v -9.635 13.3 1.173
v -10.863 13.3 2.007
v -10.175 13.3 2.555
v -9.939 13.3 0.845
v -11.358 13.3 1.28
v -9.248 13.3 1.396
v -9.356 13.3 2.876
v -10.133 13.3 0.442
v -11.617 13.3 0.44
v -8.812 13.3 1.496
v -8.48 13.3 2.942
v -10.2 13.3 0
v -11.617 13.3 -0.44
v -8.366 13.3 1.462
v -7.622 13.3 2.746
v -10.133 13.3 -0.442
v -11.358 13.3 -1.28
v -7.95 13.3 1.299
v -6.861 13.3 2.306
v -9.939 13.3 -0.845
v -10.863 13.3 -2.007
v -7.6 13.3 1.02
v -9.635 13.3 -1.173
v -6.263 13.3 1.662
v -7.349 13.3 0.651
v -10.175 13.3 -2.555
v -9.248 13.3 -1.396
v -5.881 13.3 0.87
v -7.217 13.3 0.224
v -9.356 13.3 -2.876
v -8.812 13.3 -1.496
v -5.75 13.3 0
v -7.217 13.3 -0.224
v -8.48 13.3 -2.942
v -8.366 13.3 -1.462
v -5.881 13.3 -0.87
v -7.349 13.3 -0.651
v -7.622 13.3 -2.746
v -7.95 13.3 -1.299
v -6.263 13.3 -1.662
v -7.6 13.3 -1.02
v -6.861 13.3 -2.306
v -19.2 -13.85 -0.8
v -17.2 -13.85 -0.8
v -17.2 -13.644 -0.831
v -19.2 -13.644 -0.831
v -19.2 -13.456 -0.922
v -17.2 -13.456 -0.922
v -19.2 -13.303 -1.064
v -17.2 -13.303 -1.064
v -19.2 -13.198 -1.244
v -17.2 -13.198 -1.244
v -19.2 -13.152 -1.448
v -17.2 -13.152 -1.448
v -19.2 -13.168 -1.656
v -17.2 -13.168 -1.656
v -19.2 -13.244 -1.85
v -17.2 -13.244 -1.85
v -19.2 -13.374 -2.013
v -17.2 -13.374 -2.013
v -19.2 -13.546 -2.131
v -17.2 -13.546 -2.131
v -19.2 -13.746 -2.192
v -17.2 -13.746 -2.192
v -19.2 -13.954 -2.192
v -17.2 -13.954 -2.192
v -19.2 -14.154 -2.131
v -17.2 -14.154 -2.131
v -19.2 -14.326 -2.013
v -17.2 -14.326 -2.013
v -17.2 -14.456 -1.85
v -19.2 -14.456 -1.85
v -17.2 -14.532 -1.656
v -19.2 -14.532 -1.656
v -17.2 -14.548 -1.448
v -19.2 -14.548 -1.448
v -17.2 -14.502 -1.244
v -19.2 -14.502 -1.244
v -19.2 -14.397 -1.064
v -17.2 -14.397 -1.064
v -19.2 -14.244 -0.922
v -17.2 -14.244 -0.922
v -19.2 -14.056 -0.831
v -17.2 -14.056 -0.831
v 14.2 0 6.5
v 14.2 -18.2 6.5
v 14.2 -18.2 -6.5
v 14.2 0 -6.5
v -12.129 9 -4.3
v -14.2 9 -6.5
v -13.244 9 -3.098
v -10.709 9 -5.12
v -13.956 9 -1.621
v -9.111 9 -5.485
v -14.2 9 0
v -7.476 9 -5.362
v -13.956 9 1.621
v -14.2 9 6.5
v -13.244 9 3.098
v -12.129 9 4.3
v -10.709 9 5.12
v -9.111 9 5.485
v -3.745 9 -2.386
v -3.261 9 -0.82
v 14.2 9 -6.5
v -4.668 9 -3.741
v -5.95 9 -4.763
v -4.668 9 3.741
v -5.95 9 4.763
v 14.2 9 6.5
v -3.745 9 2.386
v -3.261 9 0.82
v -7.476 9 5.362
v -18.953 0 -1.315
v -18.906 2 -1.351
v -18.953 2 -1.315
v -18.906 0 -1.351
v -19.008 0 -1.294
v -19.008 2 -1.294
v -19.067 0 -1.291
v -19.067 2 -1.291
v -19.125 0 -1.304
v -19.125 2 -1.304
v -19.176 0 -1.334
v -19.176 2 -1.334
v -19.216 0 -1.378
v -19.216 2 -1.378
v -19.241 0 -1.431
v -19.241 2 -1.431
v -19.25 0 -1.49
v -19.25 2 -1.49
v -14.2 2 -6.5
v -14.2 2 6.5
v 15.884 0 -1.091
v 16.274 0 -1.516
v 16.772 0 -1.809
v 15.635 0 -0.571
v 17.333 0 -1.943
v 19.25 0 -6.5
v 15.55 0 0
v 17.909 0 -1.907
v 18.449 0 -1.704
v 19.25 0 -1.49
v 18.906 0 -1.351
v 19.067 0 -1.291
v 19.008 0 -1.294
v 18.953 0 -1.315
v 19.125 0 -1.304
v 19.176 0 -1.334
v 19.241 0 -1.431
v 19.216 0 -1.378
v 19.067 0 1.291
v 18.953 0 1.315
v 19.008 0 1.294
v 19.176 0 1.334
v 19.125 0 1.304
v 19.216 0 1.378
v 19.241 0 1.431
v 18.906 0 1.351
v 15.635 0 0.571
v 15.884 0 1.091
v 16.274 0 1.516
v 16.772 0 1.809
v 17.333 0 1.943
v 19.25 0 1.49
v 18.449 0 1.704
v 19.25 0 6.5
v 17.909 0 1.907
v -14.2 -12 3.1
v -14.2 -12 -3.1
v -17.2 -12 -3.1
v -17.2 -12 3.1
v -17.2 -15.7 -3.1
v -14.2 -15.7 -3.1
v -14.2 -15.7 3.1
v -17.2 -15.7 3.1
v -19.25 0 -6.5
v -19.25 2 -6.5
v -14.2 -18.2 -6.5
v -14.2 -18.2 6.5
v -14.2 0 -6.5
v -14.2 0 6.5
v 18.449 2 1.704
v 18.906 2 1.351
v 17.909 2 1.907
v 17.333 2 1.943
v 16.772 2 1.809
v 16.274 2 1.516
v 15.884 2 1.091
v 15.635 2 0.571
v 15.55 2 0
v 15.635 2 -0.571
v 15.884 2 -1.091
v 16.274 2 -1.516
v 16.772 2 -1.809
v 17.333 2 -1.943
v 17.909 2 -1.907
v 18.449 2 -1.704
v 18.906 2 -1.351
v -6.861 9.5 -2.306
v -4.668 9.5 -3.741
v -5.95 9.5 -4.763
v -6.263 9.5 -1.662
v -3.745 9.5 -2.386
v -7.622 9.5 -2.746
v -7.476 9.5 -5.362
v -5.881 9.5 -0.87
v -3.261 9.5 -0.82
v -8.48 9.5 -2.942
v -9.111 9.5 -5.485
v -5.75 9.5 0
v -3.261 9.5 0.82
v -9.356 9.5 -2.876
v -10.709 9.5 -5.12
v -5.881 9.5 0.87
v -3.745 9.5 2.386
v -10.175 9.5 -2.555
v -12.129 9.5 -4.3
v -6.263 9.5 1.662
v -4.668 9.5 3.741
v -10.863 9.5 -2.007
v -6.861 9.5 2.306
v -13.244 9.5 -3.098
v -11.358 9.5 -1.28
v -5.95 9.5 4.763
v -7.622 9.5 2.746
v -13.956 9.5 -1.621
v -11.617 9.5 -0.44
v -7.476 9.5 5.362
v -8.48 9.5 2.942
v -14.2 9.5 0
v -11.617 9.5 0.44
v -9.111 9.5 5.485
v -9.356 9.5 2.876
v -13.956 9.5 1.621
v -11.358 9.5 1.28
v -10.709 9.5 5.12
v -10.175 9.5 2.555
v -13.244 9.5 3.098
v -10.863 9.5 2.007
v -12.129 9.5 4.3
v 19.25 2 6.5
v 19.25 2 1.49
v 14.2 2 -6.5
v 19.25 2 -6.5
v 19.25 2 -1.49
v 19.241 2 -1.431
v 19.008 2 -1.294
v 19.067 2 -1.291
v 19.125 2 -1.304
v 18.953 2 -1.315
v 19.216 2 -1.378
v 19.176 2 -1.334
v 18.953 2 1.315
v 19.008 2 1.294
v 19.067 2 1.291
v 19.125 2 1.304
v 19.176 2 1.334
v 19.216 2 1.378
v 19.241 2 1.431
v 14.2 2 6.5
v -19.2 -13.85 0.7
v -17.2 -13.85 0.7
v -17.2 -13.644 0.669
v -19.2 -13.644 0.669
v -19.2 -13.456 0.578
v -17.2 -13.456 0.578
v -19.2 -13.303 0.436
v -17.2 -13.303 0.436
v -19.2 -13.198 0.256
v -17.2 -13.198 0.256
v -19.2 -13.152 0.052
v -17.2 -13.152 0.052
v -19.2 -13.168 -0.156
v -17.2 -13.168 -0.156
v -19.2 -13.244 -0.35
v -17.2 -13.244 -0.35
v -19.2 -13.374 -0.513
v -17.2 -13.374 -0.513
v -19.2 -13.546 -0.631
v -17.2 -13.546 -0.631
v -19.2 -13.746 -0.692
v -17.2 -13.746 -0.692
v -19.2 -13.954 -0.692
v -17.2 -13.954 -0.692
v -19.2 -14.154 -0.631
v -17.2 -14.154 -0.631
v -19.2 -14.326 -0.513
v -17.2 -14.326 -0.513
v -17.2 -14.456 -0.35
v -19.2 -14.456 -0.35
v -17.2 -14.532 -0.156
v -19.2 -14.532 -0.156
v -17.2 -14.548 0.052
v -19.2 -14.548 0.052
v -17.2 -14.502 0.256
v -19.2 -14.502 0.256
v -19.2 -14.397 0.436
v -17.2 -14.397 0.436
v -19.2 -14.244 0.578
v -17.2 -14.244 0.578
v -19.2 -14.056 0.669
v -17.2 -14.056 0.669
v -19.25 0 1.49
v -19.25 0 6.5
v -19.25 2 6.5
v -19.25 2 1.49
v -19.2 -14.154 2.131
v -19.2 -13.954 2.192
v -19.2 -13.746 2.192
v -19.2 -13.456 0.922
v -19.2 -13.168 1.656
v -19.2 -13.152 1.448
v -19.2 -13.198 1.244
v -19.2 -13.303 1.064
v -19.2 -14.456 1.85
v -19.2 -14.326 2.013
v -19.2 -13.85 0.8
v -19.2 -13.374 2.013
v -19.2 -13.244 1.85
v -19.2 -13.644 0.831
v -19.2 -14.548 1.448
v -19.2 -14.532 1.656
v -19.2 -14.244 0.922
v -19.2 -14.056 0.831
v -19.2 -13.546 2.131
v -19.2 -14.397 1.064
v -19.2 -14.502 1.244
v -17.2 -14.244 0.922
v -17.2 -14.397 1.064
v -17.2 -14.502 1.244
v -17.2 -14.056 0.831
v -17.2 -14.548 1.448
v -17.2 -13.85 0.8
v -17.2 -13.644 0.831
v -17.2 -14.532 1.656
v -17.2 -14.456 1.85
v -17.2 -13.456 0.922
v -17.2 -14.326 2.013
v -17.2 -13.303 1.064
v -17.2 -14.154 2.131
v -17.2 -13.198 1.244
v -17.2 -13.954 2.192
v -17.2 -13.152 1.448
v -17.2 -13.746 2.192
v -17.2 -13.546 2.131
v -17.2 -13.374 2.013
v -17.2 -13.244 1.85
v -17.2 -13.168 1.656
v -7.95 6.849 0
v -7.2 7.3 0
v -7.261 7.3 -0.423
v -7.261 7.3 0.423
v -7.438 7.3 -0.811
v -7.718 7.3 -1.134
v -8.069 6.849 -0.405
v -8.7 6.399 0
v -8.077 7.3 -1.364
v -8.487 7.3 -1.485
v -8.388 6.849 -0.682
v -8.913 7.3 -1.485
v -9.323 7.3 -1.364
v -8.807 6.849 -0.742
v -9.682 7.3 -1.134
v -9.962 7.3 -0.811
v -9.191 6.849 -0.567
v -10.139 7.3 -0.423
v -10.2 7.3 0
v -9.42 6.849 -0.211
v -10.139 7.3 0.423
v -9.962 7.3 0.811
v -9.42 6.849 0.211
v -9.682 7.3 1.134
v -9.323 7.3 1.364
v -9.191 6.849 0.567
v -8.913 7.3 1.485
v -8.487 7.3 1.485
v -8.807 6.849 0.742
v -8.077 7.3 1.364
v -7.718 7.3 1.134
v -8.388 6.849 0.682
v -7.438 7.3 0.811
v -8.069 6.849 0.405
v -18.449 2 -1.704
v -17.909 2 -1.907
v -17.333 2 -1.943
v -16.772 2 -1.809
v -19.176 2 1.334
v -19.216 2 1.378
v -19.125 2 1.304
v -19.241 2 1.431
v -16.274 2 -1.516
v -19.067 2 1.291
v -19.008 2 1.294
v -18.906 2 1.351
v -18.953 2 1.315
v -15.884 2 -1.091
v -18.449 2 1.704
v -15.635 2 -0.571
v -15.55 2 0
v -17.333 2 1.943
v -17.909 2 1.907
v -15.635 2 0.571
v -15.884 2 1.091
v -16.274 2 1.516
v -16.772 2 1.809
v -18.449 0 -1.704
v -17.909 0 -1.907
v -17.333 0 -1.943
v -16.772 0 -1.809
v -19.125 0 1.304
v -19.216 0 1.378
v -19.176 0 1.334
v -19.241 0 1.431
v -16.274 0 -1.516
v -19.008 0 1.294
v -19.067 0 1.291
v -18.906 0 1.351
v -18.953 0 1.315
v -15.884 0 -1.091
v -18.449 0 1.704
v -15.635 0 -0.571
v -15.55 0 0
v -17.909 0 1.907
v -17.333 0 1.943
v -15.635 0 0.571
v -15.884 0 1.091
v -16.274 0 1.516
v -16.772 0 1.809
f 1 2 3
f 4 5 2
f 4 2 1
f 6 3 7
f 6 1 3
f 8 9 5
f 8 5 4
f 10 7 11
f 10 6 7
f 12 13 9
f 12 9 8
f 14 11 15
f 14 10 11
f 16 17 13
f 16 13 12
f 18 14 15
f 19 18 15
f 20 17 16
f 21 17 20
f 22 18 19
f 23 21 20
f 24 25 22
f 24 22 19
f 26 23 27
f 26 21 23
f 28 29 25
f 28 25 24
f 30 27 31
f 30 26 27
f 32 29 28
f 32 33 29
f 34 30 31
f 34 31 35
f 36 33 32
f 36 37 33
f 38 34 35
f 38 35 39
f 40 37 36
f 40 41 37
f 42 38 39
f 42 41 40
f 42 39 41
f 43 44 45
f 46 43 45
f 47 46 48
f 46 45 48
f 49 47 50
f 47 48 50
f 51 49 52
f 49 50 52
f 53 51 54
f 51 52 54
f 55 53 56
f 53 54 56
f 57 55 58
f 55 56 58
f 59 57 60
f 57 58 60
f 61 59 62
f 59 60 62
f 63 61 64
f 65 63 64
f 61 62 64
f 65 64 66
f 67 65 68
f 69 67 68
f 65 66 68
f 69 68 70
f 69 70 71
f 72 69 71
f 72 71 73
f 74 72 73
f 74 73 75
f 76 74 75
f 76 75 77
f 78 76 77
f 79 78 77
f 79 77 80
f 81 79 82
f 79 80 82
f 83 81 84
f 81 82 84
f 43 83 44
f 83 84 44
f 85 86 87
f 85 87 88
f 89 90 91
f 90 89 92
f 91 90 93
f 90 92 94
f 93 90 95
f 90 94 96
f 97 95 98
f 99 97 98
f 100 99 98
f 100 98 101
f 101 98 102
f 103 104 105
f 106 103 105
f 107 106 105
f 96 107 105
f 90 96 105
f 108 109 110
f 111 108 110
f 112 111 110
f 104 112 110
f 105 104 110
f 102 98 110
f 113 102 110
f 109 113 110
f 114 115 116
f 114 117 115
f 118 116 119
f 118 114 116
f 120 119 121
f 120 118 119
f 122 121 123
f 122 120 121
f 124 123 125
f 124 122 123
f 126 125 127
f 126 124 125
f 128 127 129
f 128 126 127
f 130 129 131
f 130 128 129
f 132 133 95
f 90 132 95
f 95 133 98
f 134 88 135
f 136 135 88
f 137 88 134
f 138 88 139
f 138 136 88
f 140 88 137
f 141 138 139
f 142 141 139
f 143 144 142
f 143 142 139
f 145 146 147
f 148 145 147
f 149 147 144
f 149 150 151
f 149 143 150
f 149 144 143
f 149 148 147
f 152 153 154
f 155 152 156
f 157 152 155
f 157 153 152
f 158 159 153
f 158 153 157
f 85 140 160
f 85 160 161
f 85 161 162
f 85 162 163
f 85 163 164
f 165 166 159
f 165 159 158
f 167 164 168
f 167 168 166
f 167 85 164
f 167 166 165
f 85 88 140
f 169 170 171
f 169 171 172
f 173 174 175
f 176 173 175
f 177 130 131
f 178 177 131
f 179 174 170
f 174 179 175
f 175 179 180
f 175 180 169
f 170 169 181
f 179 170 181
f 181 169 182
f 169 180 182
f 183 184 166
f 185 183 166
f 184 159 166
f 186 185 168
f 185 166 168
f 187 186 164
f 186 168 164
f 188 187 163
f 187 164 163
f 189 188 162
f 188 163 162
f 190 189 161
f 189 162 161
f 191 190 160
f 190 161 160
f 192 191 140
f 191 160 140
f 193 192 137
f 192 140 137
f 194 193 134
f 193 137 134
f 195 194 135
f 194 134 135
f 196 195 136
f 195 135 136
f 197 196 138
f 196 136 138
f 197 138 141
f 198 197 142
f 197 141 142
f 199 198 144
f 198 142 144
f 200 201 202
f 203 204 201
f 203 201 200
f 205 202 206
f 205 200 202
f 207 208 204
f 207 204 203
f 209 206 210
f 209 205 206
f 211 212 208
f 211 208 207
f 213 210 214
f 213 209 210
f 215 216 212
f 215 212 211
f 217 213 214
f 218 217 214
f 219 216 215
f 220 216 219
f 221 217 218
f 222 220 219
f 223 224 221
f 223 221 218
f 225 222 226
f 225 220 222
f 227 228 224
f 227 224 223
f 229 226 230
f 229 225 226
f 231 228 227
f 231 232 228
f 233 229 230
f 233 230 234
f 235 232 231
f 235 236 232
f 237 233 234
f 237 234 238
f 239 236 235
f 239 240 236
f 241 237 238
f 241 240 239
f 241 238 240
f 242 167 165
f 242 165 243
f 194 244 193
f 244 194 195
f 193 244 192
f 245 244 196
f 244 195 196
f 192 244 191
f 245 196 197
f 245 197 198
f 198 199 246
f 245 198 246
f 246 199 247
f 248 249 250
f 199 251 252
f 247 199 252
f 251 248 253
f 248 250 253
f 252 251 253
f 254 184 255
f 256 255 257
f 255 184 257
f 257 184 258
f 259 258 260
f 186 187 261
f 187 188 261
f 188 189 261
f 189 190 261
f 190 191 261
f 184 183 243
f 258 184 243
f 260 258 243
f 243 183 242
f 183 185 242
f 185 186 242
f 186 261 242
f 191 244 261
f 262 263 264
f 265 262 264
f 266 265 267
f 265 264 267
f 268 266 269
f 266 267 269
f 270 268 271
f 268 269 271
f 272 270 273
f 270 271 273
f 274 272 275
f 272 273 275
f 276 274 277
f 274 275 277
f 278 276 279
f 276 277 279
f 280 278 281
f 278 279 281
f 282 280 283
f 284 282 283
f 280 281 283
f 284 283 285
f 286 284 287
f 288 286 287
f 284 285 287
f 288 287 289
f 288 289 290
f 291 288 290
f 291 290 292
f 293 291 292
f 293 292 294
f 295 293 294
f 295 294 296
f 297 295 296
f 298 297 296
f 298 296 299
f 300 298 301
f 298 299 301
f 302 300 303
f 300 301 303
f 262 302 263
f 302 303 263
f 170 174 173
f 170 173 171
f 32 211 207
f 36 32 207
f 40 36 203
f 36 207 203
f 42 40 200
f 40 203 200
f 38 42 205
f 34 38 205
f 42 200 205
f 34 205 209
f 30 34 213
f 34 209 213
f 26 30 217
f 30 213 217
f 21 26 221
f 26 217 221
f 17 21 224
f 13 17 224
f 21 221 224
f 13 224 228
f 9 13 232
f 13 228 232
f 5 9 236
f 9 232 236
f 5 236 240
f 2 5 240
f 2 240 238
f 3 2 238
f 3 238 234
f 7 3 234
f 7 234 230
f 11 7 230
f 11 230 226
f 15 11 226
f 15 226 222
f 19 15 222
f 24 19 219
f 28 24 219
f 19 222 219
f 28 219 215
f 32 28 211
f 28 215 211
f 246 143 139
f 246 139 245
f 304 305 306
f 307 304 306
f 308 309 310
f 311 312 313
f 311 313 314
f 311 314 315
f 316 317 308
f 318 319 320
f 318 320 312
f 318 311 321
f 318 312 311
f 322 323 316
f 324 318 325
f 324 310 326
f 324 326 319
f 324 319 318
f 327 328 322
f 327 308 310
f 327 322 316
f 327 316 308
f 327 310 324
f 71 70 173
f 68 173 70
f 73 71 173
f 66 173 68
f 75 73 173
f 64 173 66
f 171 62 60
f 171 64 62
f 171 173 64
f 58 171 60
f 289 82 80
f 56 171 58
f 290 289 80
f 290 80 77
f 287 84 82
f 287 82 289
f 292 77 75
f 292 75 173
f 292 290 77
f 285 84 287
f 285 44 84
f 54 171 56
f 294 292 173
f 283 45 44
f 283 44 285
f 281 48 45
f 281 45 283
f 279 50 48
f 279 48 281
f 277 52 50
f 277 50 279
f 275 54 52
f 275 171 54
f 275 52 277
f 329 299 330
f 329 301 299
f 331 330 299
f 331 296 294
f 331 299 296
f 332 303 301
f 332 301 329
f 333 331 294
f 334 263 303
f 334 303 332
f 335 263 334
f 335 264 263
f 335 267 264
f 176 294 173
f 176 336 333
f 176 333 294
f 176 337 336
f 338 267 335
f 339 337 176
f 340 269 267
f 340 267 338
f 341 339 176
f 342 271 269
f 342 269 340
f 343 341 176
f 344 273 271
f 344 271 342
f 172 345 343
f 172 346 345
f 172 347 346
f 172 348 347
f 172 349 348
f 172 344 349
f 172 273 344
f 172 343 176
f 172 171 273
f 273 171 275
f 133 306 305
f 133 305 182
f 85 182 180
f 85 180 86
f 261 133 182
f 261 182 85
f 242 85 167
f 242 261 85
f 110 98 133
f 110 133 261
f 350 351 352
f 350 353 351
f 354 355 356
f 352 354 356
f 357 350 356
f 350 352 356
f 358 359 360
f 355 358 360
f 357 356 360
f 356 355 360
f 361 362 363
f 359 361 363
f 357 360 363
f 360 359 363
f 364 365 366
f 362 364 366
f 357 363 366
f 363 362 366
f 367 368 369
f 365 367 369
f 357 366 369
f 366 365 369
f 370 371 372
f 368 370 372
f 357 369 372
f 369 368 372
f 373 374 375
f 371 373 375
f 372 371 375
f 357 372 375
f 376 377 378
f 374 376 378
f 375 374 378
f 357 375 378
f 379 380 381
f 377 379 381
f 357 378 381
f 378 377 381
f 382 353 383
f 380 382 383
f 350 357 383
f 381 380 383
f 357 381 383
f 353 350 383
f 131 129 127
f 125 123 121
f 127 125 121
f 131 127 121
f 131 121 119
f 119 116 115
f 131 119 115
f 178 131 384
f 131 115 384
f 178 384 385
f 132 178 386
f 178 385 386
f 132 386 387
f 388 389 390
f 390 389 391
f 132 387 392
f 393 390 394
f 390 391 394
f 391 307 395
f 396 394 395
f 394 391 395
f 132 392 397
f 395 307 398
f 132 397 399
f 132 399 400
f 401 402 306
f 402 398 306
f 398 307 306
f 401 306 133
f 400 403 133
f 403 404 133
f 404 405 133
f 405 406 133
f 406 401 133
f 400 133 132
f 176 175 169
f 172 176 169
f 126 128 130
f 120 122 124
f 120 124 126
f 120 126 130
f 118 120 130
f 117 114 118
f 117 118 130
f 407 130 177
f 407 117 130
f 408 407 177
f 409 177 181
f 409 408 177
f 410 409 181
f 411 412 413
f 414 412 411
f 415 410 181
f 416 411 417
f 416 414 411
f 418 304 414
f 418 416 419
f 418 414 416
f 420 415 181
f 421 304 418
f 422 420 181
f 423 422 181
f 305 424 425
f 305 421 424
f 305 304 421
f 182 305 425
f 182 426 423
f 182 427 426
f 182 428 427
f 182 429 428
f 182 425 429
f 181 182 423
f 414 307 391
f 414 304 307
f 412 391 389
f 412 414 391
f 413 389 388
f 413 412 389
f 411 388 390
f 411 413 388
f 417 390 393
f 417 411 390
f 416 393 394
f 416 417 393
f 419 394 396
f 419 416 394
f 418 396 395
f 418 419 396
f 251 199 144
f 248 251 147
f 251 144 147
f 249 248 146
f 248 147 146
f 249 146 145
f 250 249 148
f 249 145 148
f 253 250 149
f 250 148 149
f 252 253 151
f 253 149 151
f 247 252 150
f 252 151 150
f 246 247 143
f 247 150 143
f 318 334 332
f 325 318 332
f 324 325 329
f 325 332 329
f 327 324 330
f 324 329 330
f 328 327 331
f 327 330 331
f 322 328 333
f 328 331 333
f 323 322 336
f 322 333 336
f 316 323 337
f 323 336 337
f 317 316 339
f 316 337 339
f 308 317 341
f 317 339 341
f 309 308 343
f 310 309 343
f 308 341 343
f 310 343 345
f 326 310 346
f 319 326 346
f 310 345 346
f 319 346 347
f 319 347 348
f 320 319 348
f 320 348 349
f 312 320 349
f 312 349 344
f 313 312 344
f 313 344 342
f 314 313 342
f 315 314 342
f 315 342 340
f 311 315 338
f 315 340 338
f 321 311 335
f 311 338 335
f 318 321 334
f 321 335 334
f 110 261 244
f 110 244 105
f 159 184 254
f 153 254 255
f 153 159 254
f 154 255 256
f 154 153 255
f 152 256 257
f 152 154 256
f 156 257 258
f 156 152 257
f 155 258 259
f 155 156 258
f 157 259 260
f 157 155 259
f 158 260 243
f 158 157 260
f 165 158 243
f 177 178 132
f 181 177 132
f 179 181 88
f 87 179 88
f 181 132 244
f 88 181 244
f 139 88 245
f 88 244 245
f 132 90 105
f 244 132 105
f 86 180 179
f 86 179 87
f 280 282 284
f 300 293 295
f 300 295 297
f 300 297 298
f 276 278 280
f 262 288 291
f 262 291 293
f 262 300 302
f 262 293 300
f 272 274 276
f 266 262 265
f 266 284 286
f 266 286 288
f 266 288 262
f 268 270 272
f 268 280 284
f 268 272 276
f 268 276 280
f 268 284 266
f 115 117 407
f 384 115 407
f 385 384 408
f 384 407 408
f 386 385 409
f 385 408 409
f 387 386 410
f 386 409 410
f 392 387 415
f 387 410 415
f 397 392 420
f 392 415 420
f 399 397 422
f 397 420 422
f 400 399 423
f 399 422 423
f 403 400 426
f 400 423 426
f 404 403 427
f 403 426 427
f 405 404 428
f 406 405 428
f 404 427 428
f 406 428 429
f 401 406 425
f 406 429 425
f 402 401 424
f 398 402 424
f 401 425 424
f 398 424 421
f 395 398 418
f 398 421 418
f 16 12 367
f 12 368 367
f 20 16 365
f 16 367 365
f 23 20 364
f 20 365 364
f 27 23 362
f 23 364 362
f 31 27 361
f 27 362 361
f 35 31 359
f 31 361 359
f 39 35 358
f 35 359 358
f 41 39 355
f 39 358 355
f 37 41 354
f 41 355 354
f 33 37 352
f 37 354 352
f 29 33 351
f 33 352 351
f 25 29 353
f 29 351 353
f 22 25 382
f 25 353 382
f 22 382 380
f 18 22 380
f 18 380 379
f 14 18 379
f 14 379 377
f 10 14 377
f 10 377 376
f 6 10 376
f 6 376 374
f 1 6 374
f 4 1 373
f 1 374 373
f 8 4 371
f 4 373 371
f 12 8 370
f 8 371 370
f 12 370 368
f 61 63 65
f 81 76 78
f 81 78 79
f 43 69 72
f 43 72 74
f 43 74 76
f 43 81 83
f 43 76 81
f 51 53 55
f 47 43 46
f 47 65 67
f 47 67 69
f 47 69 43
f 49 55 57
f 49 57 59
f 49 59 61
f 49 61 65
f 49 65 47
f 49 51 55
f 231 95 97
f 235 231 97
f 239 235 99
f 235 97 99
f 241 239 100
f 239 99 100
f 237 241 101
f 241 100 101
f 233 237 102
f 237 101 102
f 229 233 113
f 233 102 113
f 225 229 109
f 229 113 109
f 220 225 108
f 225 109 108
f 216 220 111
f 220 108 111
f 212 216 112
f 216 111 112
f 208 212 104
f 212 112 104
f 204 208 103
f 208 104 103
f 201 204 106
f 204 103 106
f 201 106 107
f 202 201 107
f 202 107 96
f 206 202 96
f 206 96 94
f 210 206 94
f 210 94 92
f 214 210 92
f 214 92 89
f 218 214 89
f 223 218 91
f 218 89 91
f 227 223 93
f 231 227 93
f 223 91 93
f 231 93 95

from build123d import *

# Parameters (mm, degrees)
ESQUISSE1_W                       = 28.4
ESQUISSE1_H                       = 27.2
ESQUISSE1_W_2                     = 5.05
ESQUISSE1_H_2                     = 2
BOSS_EXTRU_1_DEPTH                = 6.5
DIAM_TRE_DU_PER_AGE_3_9_3_9_1_D   = 3.9
CONG_1_R                          = 0.2
ESQUISSE6_R                       = 5.5
BOSS_EXTRU_4_DEPTH                = 0.5
ESQUISSE4_R                       = 2.95
BOSS_EXTRU_2_DEPTH                = 3.8
DIAM_TRE_DU_PER_AGE_3_0_3_1_D     = 3
DIAM_TRE_DU_PER_AGE_3_0_3_1_DEPTH = 6
DIAM_TRE_DU_PER_AGE_3_0_3_1_TIP   = 0.901290929
ESQUISSE8_W                       = 6.2
ESQUISSE8_H                       = 3.7
BOSS_EXTRU_5_DEPTH                = 3
ESQUISSE9_R                       = 0.7
BOSS_EXTRU_6_DEPTH                = 2


with BuildPart() as part:
    # Esquisse1 → Boss.-Extru.1 (new, symmetric)
    with BuildSketch(Plane.XY):
        with Locations((0, -4.6)):
            Rectangle(ESQUISSE1_W, ESQUISSE1_H)
        with Locations((-16.725, 1)):
            Rectangle(ESQUISSE1_W_2, ESQUISSE1_H_2)
        with Locations((16.725, 1)):
            Rectangle(ESQUISSE1_W_2, ESQUISSE1_H_2)
    extrude(amount=BOSS_EXTRU_1_DEPTH, both=True)

    # Diamètre du perçage Ø3.9 (3.9)1 (through all)
    with Locations(Plane(origin=(0, 2, 0), x_dir=(1, 0, 0), z_dir=(0, 1, 0))):
        with Locations((-17.5, 0), (17.5, 0)):
            Hole(DIAM_TRE_DU_PER_AGE_3_9_3_9_1_D / 2)

    # Congé1
    cong_1_edges = [part.edges().sort_by_distance(p)[0] for p in [
        (19.25, 1, -0.860232527),
        (19.25, 1, 0.860232527),
        (-19.25, 1, -0.860232527),
        (-19.25, 1, 0.860232527),
    ]]
    fillet(cong_1_edges, radius=CONG_1_R)

    # Esquisse6 → Boss.-Extru.4 (add)
    with BuildSketch(Plane(origin=(0, 9, 0), x_dir=(1, 0, 0), z_dir=(0, 1, 0))):
        with Locations(Location((-8.7, 0, 0), (0, 0, 180))):
            Circle(ESQUISSE6_R)
    extrude(amount=BOSS_EXTRU_4_DEPTH)

    # Esquisse4 → Boss.-Extru.2 (add)
    with BuildSketch(Plane(origin=(0, 9.5, 0), x_dir=(1, 0, 0), z_dir=(0, 1, 0))):
        with Locations((-8.7, 0)):
            Circle(ESQUISSE4_R)
    extrude(amount=BOSS_EXTRU_2_DEPTH)

    # Diamètre du perçage Ø3.0 (3)1
    with Locations(Plane(origin=(0, 13.3, 0), x_dir=(1, 0, 0), z_dir=(0, 1, 0))):
        with Locations((-8.7, 0)):
            Hole(DIAM_TRE_DU_PER_AGE_3_0_3_1_D / 2, depth=DIAM_TRE_DU_PER_AGE_3_0_3_1_DEPTH)
            with Locations((0, 0, -(DIAM_TRE_DU_PER_AGE_3_0_3_1_DEPTH + DIAM_TRE_DU_PER_AGE_3_0_3_1_TIP / 2))):  # 118° drill point
                Cone(0, DIAM_TRE_DU_PER_AGE_3_0_3_1_D / 2, DIAM_TRE_DU_PER_AGE_3_0_3_1_TIP, mode=Mode.SUBTRACT)

    # Esquisse8 → Boss.-Extru.5 (add)
    with BuildSketch(Plane.ZY.offset(14.2)):
        with Locations((0, -13.85)):
            Rectangle(ESQUISSE8_W, ESQUISSE8_H)
    extrude(amount=BOSS_EXTRU_5_DEPTH)

    # Esquisse9 → Boss.-Extru.6 (add)
    with BuildSketch(Plane.ZY.offset(17.2)):
        with Locations((0, -13.85)):
            Circle(ESQUISSE9_R)
        with Locations((-1.5, -13.85)):
            Circle(ESQUISSE9_R)
        with Locations(Location((1.5, -13.85, 0), (0, 0, 180))):
            Circle(ESQUISSE9_R)
    extrude(amount=BOSS_EXTRU_6_DEPTH)


solid = part.part
